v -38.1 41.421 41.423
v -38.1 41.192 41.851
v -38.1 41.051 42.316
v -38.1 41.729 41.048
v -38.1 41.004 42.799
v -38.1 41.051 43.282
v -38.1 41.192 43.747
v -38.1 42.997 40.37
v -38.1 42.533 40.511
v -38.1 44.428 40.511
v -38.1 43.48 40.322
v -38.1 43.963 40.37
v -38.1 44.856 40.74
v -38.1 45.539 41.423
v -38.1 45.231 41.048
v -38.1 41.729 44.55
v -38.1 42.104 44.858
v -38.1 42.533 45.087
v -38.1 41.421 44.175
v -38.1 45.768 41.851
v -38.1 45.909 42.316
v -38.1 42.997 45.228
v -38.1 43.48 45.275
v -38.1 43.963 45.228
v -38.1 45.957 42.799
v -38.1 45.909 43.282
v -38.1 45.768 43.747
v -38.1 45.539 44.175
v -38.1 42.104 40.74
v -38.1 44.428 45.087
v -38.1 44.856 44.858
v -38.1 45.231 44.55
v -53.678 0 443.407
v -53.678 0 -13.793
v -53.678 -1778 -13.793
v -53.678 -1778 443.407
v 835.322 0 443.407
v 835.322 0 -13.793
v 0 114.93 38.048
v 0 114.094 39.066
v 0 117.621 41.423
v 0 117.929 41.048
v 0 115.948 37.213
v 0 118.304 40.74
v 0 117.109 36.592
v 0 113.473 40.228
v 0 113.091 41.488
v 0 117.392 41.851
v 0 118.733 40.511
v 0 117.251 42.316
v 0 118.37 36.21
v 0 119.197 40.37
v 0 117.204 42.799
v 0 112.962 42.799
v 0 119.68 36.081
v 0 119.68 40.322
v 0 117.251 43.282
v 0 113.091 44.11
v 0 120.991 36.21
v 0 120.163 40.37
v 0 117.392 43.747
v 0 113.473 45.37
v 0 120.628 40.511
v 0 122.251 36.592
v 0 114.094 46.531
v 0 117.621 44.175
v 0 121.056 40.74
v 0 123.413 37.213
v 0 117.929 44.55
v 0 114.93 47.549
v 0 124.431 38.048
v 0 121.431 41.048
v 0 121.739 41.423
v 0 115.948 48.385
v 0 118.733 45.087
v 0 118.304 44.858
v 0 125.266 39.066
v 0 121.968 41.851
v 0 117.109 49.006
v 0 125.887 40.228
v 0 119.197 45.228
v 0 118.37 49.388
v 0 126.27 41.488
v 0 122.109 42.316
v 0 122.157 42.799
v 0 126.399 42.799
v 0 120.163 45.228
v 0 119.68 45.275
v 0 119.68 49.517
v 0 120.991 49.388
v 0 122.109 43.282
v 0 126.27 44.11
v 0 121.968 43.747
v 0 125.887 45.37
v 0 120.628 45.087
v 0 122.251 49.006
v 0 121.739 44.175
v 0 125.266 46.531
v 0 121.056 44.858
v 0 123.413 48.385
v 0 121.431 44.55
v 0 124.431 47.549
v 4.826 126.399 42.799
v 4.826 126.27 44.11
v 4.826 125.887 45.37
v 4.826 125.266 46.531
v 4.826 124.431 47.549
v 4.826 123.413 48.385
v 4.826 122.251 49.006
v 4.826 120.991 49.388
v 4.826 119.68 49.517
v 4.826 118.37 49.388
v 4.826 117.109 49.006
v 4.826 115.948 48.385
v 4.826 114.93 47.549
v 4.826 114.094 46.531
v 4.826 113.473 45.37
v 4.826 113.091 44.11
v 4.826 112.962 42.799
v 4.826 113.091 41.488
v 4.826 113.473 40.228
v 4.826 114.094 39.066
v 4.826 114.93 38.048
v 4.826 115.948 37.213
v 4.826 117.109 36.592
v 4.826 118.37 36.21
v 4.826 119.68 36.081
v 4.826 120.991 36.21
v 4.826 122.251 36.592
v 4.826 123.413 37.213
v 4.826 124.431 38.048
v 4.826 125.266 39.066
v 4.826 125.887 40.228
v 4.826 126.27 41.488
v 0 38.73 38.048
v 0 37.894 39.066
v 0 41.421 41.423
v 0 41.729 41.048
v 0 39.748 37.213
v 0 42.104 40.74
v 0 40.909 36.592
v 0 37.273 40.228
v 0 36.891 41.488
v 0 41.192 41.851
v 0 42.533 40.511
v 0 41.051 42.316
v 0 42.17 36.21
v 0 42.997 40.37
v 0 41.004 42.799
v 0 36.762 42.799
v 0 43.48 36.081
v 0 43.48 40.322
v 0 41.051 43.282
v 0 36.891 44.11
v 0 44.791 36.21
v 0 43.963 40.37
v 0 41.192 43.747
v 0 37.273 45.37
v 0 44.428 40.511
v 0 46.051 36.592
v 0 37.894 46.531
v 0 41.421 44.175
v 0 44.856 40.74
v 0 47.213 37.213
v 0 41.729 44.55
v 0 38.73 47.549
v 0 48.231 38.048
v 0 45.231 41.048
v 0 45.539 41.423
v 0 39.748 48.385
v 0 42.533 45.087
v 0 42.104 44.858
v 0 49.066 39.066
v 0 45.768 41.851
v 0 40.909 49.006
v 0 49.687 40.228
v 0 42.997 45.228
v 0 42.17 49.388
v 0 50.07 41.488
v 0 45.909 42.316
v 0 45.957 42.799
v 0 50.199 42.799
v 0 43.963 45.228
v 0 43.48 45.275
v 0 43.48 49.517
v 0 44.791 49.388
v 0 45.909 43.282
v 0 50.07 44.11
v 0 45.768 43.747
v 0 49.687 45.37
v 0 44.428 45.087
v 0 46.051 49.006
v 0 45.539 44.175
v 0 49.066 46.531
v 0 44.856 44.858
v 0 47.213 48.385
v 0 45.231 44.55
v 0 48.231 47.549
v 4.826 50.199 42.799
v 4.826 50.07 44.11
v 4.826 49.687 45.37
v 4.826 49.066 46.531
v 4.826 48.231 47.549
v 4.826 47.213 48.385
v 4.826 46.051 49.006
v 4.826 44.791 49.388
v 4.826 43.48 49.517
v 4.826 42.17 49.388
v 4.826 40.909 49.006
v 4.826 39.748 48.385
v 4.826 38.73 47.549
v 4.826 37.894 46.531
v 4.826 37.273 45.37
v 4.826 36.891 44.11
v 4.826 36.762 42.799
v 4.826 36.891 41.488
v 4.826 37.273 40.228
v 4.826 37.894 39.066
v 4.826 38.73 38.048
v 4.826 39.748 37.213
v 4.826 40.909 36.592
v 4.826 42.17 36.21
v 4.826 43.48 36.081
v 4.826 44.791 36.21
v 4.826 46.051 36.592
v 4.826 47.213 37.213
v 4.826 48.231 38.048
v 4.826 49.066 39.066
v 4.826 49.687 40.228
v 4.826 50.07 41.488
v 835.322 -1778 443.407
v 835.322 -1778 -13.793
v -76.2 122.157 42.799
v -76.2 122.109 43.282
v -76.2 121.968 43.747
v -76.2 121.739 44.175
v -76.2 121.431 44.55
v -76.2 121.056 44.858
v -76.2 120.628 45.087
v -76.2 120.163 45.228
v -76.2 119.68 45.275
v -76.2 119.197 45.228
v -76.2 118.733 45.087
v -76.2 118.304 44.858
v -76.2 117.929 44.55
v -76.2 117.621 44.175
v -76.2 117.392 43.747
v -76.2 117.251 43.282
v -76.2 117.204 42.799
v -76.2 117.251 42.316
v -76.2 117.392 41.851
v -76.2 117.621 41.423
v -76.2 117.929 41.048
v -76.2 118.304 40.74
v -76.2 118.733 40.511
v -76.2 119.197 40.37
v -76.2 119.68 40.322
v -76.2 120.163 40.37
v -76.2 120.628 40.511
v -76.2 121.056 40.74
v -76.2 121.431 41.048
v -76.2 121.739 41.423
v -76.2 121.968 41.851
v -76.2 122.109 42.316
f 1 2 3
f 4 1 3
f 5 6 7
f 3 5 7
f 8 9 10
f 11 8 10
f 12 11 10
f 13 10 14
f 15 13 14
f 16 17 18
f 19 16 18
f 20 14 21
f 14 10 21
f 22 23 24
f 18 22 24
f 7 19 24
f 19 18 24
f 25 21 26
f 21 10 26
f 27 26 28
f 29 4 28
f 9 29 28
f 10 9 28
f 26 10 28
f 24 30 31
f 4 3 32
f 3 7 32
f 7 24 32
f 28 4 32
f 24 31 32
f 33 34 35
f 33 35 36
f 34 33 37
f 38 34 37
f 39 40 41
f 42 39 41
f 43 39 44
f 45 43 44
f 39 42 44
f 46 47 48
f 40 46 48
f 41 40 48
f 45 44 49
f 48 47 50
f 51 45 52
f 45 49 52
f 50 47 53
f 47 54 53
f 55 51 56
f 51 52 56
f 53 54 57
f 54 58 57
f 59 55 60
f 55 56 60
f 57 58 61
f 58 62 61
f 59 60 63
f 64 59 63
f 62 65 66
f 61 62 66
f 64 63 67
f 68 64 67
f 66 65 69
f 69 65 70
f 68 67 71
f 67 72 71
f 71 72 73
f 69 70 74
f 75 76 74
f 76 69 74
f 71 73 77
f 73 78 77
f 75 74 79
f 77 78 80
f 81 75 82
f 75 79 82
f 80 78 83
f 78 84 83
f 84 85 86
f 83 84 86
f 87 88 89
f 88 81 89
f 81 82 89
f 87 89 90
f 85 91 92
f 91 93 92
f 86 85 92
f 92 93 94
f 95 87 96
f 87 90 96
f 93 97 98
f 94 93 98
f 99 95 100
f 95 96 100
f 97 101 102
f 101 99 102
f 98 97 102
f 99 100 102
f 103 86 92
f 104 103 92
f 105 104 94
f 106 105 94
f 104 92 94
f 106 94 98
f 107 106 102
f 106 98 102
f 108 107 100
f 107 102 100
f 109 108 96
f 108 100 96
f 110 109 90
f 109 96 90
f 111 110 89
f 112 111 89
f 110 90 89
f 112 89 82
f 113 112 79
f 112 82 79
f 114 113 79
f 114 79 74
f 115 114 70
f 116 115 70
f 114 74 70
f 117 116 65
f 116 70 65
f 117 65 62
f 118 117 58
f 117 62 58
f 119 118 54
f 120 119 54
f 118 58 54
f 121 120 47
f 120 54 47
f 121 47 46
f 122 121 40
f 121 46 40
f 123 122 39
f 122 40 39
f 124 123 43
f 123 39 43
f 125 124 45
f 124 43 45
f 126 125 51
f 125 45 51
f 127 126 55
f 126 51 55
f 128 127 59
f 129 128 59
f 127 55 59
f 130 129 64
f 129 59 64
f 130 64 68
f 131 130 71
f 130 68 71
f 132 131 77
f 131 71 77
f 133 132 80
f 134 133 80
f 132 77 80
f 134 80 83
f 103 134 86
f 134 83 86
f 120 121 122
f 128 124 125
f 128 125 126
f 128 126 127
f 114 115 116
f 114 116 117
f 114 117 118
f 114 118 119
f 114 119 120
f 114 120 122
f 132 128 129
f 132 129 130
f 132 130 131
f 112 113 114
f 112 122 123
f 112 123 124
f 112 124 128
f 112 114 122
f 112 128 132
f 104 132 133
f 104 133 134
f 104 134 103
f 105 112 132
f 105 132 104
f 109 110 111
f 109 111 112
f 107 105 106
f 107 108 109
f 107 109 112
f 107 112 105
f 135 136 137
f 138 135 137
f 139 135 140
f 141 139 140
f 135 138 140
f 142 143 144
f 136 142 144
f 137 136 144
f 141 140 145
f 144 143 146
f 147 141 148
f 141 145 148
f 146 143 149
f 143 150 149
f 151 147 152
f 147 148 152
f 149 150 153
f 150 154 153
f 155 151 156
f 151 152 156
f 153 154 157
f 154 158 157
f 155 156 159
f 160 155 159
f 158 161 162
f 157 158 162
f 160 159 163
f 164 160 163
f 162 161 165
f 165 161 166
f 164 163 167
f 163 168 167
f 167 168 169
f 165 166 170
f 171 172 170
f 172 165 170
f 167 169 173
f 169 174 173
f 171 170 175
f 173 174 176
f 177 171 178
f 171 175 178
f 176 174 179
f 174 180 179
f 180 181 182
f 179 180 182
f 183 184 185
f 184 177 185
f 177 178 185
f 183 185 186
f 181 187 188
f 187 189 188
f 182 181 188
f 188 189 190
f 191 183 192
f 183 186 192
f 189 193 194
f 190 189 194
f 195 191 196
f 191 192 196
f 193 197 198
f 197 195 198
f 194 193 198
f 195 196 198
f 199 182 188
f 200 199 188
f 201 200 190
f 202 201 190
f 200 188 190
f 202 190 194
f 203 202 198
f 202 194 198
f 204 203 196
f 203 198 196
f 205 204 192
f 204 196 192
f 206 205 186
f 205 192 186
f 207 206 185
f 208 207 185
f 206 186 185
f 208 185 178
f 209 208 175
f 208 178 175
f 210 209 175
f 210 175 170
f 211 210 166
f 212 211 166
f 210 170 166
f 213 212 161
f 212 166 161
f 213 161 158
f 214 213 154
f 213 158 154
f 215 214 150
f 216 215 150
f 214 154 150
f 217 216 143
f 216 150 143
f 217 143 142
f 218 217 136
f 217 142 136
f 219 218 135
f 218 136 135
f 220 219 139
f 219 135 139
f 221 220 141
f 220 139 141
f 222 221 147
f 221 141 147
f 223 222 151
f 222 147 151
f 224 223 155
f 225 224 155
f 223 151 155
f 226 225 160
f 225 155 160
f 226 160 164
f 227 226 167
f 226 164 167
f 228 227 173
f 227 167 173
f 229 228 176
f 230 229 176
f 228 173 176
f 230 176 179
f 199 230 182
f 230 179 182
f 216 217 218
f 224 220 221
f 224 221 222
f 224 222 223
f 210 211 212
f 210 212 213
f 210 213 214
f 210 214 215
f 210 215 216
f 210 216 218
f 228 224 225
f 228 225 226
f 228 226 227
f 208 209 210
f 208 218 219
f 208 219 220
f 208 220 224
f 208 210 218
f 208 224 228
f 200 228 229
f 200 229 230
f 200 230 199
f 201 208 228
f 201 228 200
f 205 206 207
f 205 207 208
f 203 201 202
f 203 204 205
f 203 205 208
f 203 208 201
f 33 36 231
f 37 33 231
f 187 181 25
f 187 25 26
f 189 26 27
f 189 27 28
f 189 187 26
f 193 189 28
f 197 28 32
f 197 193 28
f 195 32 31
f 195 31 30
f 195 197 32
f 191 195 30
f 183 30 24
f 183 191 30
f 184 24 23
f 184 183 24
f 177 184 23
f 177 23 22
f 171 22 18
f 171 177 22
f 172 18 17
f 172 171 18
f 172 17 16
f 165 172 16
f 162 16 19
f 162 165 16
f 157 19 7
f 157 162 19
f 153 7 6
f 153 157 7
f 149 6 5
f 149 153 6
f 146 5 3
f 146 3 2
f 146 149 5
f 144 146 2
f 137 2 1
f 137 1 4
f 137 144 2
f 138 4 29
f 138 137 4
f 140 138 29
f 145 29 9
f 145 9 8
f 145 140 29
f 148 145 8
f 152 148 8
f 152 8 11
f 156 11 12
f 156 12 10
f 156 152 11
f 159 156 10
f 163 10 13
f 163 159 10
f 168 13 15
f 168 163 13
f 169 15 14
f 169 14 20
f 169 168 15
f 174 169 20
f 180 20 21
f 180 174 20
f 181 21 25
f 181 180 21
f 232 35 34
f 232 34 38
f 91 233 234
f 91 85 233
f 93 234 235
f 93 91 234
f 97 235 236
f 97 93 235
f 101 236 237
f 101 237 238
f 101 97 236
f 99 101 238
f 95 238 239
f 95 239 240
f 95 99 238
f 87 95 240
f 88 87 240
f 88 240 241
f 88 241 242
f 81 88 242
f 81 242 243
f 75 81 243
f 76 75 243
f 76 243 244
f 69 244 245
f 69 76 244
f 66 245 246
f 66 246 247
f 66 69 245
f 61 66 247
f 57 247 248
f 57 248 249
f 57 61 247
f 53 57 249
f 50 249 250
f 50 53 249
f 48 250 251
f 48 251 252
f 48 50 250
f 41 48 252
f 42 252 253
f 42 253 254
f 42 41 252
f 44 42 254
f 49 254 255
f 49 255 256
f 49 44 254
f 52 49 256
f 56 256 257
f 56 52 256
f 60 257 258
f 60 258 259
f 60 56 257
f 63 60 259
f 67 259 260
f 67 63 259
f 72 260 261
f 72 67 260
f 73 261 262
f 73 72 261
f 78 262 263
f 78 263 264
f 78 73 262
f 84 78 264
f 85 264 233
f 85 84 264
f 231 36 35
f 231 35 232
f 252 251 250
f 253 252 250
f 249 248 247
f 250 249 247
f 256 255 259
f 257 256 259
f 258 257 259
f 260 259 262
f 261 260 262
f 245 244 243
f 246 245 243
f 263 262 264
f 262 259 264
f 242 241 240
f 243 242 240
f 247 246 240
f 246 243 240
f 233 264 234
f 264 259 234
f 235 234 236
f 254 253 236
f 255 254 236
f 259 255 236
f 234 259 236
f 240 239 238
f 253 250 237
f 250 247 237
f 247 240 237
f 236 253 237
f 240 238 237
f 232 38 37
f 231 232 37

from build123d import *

# Parameters (mm, degrees)
F0_W     = 889
F0_H     = 457.2
F1_DEPTH = 1778
F2_R     = 2.4765
F3_DEPTH = 38.1
F4_R     = 6.7183
F5_DEPTH = 4.826
F7_DEPTH = 38.1


with BuildPart() as f1:
    # F0 (on Front) → F1 (new body)
    with BuildSketch(Plane.XZ):
        with Locations((390.8216476142, 214.8072309479)):
            Rectangle(F0_W, F0_H)
    extrude(amount=F1_DEPTH)


with BuildPart() as f3:
    # F2 (on Right) → F3 (new body)
    with BuildSketch(Plane.YZ):
        with Locations((43.4802956879, 42.7989289165)):
            Circle(F2_R)
    extrude(amount=-F3_DEPTH)

    # F4 (on face) → F5 (join)
    with BuildSketch(Plane.YZ):
        with Locations((43.4802956879, 42.7989289165)):
            Circle(F4_R)
    extrude(amount=F5_DEPTH)


with BuildPart() as f6_1:
    # F6: copy of F3
    add(f3.part.moved(Location((0, 76.2, 0))))

    # F7 (add): a face of the model
    f7_faces = [f6_1.faces().sort_by_distance(p)[0] for p in [
        (-38.1, 119.6802956879, 42.7989289165),
    ]]
    extrude(f7_faces, amount=F7_DEPTH)


solid = Compound([f1.part, f3.part, f6_1.part])
